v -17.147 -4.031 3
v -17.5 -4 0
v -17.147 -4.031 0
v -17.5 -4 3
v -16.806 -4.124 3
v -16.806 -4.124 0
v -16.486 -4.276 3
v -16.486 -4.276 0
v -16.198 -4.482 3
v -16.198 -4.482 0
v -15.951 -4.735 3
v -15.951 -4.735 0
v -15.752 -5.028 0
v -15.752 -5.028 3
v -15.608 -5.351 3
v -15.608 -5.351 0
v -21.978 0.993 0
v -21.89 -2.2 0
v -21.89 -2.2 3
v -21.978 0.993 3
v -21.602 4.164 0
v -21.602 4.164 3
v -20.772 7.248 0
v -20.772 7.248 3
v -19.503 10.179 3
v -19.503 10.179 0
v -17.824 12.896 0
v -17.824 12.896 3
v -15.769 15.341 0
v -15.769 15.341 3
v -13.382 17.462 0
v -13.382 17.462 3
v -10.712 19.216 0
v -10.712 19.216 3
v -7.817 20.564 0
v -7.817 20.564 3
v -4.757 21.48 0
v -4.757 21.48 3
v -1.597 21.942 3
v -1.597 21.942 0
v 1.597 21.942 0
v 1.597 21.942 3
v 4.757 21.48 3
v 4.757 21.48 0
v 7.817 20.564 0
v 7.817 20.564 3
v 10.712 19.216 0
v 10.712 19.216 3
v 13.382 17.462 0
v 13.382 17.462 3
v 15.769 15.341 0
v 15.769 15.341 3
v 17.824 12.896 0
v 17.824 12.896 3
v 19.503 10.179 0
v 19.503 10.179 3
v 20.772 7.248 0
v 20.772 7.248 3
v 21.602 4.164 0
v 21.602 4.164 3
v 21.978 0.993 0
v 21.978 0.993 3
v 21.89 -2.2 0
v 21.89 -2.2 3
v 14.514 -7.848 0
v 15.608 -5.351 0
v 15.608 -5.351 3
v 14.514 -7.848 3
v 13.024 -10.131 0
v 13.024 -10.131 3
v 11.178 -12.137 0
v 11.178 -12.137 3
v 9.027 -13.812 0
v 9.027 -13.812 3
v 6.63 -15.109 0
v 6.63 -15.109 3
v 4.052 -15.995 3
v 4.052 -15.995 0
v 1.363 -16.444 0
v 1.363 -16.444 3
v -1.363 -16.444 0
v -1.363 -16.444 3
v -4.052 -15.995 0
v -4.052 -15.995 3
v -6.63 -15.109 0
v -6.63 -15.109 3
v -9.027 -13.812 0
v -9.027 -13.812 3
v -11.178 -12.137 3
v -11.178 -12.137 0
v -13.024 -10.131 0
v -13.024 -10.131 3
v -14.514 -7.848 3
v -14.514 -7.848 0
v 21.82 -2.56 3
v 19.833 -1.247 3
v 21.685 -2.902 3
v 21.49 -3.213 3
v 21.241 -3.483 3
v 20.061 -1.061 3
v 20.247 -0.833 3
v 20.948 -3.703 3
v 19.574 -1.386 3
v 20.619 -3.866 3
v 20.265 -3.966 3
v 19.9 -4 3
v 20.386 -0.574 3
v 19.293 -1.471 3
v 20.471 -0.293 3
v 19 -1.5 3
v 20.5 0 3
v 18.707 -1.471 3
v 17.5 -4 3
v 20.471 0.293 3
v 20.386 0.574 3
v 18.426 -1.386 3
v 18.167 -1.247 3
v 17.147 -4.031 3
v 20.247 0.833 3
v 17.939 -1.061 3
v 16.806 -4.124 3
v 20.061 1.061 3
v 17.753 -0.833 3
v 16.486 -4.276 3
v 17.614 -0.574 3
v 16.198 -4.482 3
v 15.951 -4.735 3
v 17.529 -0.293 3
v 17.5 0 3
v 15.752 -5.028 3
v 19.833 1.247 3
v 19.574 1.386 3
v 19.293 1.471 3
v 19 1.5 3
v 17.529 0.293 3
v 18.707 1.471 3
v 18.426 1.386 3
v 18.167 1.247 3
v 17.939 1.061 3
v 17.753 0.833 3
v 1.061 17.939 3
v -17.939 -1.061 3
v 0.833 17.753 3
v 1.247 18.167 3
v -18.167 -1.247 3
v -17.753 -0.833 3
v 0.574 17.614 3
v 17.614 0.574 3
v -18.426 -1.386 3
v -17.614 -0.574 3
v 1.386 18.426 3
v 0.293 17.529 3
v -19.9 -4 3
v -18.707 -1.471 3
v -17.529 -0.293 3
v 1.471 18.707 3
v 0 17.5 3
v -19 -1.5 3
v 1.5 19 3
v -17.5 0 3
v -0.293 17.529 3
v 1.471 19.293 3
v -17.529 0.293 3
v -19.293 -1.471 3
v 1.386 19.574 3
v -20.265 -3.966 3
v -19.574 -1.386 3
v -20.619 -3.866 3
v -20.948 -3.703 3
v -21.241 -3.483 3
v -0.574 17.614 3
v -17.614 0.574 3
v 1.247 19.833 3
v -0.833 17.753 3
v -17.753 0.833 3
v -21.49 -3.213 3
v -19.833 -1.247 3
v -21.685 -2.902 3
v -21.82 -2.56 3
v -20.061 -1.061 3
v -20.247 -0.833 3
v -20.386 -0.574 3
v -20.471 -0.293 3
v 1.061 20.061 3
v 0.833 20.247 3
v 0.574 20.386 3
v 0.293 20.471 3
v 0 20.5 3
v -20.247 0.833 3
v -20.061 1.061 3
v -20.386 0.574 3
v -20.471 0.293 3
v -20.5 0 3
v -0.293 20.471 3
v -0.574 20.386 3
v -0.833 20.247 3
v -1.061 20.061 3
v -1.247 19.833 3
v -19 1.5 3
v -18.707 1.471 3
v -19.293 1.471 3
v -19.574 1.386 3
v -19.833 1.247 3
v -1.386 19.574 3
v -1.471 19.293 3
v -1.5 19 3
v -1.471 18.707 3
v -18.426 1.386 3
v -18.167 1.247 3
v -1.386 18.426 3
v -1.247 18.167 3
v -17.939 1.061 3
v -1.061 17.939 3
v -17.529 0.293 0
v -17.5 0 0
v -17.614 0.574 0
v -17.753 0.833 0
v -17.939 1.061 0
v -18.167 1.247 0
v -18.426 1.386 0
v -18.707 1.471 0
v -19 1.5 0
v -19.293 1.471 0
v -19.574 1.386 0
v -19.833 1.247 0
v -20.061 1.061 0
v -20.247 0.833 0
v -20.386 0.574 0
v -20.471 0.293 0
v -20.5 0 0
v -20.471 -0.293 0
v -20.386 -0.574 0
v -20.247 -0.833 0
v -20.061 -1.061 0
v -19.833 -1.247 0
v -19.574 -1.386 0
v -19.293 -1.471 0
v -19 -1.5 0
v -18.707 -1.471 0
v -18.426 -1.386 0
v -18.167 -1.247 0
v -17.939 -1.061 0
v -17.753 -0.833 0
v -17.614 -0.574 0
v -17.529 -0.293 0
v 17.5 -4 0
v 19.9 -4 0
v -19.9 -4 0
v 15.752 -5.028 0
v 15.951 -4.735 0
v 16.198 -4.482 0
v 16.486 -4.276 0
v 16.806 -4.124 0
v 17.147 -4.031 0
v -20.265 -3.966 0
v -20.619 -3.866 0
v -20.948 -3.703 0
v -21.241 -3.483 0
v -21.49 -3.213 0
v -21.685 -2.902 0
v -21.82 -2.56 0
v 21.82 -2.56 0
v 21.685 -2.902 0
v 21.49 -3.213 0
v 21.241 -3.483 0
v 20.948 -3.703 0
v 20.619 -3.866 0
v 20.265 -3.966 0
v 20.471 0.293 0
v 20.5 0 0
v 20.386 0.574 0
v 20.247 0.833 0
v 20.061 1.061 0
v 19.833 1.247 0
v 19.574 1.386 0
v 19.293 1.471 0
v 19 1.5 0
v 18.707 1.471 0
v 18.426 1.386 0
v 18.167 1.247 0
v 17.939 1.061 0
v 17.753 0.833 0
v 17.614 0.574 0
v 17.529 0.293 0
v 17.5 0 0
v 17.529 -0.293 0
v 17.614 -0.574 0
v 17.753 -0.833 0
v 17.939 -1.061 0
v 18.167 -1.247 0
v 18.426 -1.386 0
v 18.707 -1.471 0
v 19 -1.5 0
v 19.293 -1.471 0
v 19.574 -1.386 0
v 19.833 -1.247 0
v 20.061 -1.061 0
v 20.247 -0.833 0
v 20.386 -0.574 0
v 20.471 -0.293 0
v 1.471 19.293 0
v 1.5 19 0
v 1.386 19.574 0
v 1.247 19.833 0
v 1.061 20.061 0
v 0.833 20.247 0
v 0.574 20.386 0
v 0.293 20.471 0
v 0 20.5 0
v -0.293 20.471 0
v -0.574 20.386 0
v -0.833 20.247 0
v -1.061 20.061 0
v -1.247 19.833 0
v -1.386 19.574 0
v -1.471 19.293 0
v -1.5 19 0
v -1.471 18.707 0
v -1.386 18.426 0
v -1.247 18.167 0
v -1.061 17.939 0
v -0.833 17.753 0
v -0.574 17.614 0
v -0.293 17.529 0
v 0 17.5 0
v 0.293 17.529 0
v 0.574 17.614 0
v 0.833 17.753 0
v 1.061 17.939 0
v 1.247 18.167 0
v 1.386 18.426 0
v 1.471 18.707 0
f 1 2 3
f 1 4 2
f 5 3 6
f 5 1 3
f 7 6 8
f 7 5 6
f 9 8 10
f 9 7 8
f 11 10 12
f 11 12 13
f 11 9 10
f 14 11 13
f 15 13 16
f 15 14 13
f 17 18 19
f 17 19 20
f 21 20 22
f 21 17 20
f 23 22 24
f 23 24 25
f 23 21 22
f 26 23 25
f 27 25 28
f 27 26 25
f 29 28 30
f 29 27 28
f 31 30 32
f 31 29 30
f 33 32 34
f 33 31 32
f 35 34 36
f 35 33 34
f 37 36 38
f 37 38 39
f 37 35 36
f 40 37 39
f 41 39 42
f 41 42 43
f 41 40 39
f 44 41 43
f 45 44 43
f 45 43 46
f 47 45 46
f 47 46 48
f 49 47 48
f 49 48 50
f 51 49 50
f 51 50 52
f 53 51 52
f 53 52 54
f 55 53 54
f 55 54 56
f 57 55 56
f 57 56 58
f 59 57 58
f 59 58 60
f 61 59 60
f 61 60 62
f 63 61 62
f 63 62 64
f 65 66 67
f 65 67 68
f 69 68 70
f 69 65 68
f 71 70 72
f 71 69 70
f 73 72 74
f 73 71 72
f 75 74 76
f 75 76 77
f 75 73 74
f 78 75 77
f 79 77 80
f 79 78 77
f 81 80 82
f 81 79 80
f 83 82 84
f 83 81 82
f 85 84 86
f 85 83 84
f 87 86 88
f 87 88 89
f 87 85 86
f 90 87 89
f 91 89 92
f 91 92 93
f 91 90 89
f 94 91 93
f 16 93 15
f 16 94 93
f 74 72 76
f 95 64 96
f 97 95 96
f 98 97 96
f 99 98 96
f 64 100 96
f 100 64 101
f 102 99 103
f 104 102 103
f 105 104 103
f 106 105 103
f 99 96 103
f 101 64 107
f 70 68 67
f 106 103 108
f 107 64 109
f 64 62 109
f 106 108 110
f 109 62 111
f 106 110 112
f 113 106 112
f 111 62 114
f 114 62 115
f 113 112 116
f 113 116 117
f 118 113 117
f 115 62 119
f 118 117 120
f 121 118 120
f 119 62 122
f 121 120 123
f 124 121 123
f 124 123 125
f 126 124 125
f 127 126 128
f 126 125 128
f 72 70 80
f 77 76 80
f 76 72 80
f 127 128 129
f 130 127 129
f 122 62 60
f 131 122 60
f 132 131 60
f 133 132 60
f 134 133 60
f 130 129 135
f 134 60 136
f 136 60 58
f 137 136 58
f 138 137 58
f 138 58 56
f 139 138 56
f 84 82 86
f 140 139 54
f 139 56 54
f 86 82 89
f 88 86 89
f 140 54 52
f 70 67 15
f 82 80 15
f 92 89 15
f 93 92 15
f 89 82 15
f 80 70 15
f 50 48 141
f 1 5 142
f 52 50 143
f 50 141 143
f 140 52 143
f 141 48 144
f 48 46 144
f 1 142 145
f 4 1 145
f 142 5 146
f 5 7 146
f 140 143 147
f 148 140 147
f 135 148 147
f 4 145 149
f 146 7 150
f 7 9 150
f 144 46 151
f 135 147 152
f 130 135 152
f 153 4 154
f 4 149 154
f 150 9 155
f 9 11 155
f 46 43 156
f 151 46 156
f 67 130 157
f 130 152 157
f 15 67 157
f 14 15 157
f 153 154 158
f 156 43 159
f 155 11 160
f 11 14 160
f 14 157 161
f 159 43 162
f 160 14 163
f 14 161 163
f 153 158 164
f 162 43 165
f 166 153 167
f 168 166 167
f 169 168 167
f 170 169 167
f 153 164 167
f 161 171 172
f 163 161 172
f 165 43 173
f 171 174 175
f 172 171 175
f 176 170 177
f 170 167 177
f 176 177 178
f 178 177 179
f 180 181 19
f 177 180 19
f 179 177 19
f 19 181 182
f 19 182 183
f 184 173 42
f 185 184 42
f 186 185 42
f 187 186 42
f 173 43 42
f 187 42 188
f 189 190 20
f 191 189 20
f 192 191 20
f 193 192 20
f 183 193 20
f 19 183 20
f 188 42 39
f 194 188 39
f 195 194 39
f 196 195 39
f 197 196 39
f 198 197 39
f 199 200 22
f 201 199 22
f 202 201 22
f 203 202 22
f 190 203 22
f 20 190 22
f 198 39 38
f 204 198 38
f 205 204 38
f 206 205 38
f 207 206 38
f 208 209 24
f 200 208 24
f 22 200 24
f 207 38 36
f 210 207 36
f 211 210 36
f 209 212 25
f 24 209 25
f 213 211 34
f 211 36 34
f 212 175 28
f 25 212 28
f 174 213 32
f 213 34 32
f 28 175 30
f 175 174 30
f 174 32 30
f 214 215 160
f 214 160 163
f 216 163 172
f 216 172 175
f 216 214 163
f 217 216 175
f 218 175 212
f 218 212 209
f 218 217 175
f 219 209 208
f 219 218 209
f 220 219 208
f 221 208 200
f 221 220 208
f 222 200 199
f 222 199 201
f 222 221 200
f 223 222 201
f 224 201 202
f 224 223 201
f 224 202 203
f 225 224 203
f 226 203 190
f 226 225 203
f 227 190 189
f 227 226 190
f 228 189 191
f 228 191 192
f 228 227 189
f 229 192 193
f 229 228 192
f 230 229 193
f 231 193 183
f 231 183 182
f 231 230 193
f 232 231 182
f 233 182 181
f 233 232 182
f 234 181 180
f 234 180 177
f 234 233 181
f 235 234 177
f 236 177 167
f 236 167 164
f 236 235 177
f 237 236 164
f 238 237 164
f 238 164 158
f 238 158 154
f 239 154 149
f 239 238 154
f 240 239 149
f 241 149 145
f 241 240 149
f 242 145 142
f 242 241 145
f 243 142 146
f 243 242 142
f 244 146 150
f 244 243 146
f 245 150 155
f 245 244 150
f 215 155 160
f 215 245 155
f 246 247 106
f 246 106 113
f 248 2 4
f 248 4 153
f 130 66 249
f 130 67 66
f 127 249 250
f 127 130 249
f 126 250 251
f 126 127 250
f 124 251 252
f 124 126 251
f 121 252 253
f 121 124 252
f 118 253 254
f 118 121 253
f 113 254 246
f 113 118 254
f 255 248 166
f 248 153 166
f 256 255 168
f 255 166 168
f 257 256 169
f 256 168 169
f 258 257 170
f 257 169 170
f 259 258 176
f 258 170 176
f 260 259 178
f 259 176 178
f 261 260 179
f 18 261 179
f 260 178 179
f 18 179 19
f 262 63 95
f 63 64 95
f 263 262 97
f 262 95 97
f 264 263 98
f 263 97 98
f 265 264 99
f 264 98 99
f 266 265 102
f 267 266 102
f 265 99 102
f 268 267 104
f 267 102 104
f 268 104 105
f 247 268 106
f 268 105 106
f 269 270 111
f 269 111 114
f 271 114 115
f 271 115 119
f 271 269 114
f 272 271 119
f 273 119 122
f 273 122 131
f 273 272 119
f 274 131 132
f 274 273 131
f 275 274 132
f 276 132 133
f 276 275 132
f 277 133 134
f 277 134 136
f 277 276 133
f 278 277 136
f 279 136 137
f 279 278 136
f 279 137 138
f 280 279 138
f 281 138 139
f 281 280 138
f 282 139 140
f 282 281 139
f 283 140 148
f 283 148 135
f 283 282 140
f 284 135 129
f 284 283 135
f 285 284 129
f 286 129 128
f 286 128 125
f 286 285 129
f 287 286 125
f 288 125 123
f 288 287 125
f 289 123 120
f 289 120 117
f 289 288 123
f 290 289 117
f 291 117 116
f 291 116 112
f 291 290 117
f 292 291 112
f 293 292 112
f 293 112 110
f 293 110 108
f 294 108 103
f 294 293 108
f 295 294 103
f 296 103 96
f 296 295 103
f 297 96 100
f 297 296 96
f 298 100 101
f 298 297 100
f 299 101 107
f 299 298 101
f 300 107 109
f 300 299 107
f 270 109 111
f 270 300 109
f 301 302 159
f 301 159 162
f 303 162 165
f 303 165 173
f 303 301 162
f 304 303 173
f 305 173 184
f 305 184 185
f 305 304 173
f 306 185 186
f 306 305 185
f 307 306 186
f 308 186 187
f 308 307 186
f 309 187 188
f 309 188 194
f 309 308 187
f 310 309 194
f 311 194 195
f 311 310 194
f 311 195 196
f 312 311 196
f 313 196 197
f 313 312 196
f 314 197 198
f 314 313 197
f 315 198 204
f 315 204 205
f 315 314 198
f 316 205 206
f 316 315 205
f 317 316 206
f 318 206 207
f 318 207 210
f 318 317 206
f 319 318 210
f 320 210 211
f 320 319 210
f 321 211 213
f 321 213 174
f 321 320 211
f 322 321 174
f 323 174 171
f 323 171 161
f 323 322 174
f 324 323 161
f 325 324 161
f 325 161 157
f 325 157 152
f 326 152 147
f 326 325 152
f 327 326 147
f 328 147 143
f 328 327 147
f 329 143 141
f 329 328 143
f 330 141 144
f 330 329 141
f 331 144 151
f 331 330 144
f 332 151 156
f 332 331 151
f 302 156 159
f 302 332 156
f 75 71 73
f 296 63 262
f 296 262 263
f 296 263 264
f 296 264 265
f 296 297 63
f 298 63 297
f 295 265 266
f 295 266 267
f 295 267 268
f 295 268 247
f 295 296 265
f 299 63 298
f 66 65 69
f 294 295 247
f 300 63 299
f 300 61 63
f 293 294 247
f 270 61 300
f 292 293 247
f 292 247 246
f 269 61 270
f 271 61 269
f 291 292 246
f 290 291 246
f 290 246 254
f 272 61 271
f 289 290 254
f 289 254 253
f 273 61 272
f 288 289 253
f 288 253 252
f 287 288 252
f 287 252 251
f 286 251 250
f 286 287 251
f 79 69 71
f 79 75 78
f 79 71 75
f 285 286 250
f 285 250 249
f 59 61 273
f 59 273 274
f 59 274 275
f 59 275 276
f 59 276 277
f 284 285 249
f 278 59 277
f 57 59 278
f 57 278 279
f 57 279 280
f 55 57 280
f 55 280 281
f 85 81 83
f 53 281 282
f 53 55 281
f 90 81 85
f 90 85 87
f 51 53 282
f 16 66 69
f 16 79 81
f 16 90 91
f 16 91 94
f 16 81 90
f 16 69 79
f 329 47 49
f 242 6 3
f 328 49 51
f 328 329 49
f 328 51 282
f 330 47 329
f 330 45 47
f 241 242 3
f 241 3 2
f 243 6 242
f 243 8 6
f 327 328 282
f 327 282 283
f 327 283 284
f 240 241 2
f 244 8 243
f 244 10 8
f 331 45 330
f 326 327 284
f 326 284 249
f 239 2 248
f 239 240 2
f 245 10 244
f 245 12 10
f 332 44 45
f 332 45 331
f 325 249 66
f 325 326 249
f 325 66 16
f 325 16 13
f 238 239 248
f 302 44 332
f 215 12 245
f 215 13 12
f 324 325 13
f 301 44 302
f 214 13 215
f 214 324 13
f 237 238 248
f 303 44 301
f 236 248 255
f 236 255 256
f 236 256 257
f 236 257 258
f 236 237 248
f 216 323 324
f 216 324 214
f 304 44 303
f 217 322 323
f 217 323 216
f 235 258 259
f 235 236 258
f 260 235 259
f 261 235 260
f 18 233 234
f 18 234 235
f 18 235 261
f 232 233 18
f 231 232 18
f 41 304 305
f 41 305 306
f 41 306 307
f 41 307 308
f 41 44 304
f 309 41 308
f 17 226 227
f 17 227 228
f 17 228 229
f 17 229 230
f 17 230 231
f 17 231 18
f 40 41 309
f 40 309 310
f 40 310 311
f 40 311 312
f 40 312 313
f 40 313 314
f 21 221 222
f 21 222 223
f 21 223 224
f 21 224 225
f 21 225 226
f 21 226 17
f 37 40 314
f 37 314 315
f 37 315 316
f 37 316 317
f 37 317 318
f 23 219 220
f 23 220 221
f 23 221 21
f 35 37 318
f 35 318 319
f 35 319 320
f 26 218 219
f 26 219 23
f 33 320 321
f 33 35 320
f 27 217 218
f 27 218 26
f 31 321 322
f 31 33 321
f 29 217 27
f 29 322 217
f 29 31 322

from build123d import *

# Parameters (mm, degrees)
SKETCH_1_R      = 1.5
EXTRUDE_1_DEPTH = 3
FILLET_1_R      = 2


with BuildPart() as part:
    # 草图1 → 凸台-拉伸1 (new body)
    with BuildSketch(Plane.XY):
        with BuildLine():
            Line((-16.007810594, -4), (-21.633307653, -4))
            ThreePointArc((-21.633307653, -4), (0, 22), (21.633307653, -4))
            Line((21.633307653, -4), (16.007810594, -4))
            ThreePointArc((16.007810594, -4), (0, -16.5), (-16.007810594, -4))
        make_face()
        with Locations((-19, 0)):
            Circle(SKETCH_1_R, mode=Mode.SUBTRACT)
        with Locations((0, 19)):
            Circle(SKETCH_1_R, mode=Mode.SUBTRACT)
        with Locations((19, 0)):
            Circle(SKETCH_1_R, mode=Mode.SUBTRACT)
    extrude(amount=EXTRUDE_1_DEPTH)

    # 圆角1
    fillet_1_edges = [part.edges().sort_by_distance(p)[0] for p in [
        (-16.007810594, -4, 1.5),
        (-21.633307653, -4, 1.5),
        (21.633307653, -4, 1.5),
        (16.007810594, -4, 1.5),
    ]]
    fillet(fillet_1_edges, radius=FILLET_1_R)


solid = part.part
